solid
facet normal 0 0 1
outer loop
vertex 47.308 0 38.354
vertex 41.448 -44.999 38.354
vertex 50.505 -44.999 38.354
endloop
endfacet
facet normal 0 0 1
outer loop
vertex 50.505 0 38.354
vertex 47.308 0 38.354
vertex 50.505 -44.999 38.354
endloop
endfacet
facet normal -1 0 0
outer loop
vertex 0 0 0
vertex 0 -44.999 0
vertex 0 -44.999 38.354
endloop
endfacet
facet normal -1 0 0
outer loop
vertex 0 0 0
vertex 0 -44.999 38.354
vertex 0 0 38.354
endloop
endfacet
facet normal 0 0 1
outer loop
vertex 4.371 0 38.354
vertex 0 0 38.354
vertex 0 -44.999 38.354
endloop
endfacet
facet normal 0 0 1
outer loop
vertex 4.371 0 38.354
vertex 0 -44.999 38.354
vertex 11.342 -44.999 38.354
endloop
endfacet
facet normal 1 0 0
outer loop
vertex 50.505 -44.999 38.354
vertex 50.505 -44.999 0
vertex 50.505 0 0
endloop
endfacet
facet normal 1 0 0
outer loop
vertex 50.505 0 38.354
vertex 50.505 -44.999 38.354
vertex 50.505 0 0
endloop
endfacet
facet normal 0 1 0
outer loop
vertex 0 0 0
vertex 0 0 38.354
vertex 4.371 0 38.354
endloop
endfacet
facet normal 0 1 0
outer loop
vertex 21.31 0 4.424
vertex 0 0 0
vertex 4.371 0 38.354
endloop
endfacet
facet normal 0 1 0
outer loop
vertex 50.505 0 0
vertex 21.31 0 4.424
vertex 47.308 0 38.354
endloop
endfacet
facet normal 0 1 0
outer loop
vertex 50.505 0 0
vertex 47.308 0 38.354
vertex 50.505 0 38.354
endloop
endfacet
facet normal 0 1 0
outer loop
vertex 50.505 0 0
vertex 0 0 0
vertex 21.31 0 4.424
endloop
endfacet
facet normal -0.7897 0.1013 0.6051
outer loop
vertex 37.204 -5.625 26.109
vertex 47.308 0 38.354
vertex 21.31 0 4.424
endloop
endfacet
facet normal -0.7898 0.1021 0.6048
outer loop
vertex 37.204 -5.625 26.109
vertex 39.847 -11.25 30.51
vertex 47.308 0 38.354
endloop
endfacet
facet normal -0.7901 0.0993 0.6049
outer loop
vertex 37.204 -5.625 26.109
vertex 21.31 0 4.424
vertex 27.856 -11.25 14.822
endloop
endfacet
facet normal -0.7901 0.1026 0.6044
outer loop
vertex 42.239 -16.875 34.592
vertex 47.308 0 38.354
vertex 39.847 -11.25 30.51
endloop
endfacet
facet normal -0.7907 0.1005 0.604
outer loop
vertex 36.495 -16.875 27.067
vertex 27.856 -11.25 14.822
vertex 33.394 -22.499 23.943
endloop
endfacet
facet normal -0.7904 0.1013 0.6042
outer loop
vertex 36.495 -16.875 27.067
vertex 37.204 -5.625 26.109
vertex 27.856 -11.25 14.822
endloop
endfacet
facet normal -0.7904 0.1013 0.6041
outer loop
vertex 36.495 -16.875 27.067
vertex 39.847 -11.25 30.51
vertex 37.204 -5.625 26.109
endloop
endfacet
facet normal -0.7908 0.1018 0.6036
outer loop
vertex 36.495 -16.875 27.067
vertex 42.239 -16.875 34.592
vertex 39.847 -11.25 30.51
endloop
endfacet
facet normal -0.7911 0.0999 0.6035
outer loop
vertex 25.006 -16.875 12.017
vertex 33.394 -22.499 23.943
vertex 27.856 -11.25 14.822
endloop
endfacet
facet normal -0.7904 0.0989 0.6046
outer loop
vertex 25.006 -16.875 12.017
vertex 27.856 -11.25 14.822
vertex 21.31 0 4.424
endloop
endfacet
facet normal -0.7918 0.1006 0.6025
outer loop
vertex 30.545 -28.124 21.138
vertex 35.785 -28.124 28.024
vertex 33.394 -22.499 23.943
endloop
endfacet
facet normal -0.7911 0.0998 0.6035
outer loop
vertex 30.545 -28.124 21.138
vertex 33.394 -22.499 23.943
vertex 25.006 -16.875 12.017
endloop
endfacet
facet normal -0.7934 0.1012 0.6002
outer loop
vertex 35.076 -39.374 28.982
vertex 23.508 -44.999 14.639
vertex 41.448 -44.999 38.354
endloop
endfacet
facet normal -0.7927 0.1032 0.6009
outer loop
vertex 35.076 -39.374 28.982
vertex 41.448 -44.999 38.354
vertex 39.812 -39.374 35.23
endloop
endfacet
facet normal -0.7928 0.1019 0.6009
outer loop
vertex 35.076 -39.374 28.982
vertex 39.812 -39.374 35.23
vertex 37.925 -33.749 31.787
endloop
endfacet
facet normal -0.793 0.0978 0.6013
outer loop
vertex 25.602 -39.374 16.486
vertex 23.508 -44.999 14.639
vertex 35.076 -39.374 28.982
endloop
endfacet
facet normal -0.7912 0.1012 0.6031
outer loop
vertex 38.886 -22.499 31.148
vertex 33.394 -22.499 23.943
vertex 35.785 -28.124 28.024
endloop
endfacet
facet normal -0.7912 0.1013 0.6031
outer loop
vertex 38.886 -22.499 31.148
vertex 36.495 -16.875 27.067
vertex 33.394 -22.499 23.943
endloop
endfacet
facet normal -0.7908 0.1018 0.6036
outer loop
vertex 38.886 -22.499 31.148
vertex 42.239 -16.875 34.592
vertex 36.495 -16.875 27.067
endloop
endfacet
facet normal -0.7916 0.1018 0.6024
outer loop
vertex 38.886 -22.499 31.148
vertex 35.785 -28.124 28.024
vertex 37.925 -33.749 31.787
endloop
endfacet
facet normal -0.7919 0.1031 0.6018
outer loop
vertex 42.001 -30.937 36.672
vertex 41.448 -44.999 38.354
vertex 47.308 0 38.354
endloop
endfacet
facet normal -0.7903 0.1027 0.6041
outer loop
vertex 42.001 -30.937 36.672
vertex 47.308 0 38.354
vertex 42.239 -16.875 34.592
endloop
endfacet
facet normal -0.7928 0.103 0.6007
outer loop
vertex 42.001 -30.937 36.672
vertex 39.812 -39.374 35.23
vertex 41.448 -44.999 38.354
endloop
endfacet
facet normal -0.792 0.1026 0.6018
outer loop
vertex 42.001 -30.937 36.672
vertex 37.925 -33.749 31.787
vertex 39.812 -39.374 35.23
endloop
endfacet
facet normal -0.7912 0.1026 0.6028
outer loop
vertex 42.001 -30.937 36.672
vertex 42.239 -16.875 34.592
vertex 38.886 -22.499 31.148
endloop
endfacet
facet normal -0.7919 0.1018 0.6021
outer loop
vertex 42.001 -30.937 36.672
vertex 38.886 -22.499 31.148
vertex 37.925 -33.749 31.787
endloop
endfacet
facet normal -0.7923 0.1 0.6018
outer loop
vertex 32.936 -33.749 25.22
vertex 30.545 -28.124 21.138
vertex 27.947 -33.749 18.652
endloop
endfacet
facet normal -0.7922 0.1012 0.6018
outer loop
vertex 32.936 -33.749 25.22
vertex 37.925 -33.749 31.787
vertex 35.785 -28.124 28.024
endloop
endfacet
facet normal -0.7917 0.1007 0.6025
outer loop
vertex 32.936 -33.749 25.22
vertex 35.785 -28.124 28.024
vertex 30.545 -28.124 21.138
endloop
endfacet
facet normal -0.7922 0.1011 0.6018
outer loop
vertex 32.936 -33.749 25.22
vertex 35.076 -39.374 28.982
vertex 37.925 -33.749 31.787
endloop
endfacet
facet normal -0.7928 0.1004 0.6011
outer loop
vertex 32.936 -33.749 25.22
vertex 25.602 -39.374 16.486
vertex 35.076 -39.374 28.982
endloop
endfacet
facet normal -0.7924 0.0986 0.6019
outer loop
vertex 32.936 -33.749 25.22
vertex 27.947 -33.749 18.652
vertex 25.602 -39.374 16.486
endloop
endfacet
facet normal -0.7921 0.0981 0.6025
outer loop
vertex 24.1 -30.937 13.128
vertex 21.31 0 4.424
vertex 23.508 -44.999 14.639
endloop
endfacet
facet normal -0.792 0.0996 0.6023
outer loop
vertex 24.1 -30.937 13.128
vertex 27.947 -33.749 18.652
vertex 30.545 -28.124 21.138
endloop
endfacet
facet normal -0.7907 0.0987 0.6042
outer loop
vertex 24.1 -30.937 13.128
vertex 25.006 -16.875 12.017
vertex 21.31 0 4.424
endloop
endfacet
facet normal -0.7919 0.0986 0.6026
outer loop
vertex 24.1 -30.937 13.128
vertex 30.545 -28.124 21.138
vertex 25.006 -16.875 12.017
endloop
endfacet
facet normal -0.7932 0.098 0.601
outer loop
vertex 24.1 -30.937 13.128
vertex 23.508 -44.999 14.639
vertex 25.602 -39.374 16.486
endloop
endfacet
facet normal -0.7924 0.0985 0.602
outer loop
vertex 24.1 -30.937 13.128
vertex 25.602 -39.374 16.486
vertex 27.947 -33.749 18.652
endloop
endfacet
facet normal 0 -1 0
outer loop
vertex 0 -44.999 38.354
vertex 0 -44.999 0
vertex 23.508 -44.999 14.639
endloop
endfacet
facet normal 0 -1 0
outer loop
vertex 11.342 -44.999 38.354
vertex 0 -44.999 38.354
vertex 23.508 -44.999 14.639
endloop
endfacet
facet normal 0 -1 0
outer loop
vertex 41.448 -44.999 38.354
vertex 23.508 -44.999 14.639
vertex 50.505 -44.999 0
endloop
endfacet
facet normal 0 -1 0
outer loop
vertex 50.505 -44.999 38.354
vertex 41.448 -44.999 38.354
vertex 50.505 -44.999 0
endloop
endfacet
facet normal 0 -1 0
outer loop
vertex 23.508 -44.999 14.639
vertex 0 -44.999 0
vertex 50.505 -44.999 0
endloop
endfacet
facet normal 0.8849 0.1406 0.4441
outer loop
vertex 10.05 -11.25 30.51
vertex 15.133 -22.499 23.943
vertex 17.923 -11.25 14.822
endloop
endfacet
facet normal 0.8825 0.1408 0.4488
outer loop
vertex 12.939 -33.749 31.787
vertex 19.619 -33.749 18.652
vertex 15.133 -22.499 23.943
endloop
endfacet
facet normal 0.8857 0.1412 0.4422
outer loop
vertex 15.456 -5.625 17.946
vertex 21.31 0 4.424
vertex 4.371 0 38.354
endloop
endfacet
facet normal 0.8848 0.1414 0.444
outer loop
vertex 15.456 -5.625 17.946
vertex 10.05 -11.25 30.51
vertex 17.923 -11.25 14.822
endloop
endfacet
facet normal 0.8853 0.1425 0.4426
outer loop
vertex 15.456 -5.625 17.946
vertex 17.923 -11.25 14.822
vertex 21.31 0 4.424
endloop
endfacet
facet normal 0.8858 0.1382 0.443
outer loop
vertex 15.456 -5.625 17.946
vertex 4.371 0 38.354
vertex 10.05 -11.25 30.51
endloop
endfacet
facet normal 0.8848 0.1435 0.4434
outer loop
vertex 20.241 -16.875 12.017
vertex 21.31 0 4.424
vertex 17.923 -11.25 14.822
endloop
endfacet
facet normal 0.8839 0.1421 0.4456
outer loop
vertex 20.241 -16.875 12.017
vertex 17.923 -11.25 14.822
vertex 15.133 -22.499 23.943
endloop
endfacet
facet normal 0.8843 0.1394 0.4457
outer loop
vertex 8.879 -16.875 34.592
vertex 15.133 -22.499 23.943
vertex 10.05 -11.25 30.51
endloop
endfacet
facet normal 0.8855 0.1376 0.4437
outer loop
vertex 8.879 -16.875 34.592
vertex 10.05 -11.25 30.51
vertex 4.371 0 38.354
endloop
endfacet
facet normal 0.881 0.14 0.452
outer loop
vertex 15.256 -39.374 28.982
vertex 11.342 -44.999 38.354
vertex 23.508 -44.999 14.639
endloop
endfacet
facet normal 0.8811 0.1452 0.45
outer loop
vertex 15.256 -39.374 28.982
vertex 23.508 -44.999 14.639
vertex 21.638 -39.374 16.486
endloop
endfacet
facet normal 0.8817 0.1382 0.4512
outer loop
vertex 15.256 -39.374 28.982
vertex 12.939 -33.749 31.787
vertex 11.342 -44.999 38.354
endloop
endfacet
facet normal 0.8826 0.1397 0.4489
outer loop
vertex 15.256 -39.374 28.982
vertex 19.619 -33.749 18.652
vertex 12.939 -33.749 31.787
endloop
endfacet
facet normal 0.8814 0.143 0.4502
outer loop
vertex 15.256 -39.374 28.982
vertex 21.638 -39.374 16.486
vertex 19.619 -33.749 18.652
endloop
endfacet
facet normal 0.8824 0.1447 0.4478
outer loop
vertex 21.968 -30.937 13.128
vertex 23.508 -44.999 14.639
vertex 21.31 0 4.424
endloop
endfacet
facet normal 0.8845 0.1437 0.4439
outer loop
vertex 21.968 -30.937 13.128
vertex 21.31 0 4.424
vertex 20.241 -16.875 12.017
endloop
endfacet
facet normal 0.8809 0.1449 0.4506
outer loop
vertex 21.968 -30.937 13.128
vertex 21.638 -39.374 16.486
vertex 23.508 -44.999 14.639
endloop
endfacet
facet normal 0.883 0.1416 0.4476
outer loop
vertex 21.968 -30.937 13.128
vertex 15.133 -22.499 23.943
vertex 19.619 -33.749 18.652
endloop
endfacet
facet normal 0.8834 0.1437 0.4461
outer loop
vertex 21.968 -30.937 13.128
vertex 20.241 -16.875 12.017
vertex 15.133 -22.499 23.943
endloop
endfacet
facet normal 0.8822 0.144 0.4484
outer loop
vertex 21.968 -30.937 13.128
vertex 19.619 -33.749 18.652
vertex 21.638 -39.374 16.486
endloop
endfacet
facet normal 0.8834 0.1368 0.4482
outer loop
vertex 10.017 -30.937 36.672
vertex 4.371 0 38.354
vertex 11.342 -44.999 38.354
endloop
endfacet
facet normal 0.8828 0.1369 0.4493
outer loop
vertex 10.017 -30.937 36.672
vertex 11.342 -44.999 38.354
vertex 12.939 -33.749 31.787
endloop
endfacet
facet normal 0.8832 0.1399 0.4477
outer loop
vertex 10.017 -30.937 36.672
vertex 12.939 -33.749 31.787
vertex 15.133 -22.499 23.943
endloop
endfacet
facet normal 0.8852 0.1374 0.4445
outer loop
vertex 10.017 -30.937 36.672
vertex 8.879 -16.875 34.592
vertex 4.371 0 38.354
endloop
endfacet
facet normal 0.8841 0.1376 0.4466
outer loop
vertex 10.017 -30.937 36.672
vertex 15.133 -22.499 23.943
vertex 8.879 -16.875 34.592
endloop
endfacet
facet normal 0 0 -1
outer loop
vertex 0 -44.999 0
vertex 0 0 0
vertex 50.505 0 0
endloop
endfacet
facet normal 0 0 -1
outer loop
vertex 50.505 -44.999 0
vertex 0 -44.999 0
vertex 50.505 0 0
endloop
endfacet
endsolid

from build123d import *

# Parameters (mm, degrees)
F0_W     = 50.504707
F0_H     = 44.99888
F1_DEPTH = 38.354


with BuildPart() as f1:
    # F0 (on Top) → F1 (new body)
    with BuildSketch(Plane.XY):
        with Locations((25.252353, -22.49944)):
            Rectangle(F0_W, F0_H)
    extrude(amount=F1_DEPTH)

    # F3 (on face) → F4 section 0
    with BuildSketch(Plane(origin=(0, 0, 0), x_dir=(-1, 0, 0), z_dir=(0, 1, 0))):
        Polygon((-4.371133, 38.354), (-47.308076, 38.354), (-21.310192, 4.424161), align=None)
    # F2 (on face) → F4 section 1
    with BuildSketch(Plane.XZ.offset(44.99888)):
        Polygon((41.448478, 38.354), (11.341625, 38.354), (23.508094, 14.638858), align=None)
    loft(mode=Mode.SUBTRACT)


solid = f1.part
